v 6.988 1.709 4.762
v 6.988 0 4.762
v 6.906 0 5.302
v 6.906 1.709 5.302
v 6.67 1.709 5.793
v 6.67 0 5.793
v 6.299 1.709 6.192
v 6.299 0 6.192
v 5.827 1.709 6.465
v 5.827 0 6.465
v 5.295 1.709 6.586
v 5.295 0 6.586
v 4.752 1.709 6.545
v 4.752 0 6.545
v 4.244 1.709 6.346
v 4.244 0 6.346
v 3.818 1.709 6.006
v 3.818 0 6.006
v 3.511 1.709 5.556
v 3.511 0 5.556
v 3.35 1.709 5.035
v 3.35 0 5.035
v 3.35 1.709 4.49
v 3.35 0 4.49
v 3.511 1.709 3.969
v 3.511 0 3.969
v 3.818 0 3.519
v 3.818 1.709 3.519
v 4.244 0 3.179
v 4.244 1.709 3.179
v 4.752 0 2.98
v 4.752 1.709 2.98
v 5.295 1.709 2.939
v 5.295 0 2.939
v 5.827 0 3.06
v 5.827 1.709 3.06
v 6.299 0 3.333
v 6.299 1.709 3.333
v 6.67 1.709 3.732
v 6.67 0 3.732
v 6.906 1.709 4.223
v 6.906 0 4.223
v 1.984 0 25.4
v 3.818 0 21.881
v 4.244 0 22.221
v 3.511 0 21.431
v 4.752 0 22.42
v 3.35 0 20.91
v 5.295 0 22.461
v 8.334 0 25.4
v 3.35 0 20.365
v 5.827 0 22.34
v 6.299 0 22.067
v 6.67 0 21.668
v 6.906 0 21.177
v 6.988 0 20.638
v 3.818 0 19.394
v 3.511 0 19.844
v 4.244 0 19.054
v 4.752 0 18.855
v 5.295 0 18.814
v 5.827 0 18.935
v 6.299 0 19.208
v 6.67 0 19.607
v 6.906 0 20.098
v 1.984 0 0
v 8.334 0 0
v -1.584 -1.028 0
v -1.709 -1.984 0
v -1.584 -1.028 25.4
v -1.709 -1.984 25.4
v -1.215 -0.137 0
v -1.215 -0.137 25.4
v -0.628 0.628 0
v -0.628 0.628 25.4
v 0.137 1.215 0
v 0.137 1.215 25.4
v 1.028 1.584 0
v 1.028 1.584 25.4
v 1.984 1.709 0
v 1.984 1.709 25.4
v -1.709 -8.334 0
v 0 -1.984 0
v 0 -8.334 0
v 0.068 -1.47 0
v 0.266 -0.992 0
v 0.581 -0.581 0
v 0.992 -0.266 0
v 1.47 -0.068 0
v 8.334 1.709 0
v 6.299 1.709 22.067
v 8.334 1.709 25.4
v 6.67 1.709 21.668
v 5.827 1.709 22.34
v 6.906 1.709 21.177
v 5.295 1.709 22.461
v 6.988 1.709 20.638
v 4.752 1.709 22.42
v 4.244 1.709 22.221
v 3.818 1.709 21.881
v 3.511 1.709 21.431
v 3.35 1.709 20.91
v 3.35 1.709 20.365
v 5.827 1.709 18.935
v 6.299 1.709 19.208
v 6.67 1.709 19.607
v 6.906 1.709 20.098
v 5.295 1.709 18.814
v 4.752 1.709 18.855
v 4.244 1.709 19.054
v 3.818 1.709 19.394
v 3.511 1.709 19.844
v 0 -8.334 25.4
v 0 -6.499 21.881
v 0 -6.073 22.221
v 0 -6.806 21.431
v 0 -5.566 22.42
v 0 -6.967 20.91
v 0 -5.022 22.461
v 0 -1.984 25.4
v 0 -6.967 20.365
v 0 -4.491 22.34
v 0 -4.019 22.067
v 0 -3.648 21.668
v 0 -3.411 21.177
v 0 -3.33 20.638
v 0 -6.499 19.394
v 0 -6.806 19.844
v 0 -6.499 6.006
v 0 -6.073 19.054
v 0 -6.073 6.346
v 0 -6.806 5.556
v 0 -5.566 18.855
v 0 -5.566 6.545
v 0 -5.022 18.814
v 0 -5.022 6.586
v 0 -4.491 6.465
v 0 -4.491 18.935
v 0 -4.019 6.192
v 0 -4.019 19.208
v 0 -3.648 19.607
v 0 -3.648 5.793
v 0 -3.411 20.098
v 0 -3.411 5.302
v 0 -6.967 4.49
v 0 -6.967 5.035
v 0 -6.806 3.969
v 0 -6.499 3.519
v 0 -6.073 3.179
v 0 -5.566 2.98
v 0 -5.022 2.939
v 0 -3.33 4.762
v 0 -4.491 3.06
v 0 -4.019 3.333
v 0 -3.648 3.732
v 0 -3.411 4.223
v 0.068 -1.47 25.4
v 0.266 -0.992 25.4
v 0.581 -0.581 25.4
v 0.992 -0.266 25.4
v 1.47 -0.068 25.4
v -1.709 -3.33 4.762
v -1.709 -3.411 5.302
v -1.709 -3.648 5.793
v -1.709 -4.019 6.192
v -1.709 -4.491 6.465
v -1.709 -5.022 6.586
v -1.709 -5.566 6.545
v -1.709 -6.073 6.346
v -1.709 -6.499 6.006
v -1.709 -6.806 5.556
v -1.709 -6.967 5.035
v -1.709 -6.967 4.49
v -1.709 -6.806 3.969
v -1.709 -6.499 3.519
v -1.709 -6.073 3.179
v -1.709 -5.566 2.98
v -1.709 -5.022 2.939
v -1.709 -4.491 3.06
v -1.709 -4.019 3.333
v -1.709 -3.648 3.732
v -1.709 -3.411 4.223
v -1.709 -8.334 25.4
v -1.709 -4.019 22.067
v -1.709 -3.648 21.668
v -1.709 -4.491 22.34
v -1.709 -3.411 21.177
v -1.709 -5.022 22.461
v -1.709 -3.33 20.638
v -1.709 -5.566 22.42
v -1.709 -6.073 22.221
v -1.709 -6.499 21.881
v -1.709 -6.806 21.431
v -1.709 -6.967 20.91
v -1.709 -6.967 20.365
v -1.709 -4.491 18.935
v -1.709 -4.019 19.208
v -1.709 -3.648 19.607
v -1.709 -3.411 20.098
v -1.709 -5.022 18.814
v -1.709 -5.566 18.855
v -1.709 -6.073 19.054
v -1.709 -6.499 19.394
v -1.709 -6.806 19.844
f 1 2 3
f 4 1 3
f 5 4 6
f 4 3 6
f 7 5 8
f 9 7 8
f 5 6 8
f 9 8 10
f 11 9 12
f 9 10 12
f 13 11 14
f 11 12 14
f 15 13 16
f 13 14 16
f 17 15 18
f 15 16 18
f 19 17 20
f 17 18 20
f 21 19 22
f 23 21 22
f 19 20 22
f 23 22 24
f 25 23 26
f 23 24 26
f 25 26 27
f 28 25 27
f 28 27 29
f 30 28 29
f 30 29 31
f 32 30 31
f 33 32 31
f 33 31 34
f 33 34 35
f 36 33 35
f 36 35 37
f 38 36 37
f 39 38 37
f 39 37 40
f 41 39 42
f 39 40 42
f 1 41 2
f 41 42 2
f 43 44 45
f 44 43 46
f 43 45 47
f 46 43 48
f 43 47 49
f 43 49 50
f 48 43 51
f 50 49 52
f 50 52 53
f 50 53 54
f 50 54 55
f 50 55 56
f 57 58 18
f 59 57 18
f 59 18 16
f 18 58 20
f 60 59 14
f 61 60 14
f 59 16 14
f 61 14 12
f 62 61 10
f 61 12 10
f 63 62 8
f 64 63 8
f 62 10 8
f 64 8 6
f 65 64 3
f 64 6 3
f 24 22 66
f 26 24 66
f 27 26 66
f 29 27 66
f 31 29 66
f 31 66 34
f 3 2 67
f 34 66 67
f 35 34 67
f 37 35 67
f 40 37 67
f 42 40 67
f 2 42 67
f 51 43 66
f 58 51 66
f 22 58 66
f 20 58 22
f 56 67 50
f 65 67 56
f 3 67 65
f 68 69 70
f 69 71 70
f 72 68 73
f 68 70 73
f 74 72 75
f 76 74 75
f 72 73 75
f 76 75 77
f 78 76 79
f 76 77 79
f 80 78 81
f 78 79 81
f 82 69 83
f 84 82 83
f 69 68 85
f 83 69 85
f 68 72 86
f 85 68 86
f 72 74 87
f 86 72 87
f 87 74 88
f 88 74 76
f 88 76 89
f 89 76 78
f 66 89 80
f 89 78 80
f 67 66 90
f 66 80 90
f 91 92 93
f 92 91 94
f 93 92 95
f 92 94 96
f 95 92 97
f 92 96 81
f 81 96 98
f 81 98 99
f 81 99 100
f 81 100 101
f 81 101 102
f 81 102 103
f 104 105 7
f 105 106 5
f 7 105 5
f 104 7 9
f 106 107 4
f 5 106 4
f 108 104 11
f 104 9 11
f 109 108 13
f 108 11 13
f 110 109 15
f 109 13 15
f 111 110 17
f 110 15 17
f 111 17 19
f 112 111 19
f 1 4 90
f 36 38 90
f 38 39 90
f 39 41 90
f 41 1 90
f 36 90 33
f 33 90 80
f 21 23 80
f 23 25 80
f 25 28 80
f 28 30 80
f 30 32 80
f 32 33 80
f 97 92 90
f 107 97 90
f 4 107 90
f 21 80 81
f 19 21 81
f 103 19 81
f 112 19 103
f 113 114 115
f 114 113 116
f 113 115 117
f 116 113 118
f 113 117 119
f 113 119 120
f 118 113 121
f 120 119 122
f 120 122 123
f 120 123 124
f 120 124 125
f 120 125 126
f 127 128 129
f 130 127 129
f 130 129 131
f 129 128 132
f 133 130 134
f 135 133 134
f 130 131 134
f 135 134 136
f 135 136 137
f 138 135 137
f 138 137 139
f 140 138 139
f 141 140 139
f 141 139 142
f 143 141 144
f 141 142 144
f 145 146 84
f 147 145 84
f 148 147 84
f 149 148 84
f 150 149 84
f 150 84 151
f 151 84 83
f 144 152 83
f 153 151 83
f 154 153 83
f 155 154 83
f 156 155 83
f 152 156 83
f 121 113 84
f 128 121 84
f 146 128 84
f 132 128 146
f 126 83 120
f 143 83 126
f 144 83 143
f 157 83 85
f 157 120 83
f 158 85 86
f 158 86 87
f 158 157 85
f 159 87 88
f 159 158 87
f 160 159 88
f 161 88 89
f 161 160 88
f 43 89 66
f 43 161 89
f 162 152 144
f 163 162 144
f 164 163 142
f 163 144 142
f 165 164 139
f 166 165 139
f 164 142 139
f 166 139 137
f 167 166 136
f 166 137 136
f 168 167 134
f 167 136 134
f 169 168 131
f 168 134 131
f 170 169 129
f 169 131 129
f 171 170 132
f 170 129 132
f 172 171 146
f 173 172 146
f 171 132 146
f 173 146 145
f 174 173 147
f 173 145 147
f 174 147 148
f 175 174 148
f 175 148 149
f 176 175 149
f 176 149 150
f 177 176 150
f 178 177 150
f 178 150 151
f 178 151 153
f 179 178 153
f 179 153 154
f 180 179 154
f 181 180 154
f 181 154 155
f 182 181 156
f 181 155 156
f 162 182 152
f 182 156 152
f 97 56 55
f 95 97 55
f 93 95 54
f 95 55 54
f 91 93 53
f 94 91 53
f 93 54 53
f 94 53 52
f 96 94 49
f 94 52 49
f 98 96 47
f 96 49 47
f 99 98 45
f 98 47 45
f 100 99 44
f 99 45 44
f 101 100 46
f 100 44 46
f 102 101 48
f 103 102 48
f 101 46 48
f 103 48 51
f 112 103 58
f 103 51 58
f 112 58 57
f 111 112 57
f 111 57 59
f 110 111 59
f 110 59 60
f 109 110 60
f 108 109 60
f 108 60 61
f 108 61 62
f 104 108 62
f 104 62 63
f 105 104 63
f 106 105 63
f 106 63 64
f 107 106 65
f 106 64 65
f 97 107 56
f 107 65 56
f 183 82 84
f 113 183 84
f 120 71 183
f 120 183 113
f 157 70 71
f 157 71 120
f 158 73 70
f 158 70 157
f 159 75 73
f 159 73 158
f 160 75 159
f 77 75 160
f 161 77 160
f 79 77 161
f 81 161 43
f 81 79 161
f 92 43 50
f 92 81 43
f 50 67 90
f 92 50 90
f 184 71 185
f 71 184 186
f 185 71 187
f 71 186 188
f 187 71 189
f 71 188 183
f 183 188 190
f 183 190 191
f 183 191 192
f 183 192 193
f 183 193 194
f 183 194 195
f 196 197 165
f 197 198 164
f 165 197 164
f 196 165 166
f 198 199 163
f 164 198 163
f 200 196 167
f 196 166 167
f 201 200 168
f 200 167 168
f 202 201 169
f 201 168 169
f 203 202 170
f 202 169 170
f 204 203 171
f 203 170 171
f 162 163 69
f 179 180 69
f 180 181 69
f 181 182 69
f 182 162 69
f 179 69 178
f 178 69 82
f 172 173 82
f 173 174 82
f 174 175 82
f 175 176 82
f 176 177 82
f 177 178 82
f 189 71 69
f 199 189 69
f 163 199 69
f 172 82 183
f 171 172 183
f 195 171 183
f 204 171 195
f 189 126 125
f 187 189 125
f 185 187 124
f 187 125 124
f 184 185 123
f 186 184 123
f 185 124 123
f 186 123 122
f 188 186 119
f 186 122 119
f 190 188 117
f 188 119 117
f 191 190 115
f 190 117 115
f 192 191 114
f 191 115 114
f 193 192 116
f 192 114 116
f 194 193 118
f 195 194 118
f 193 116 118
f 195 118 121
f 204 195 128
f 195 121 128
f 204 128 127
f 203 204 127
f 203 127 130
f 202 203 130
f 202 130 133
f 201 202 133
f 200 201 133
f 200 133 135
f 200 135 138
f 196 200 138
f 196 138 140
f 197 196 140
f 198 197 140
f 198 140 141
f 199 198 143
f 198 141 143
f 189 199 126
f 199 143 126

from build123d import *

# Parameters (mm, degrees)
F1_DEPTH = 25.4
F2_R     = 1.8288
F3_DEPTH = 1.70942
F4_R     = 1.8288
F5_DEPTH = 1.70942
F6_R     = 1.98374
F7_R     = 3.69316


with BuildPart() as f1:
    # F0 (on Top) → F1 (new body)
    with BuildSketch(Plane.XY):
        Polygon((-1.70942, -8.33374), (0, -8.33374), (0, 0), (8.33374, 0), (8.33374, 1.70942), (-1.70942, 1.70942), align=None)
    extrude(amount=F1_DEPTH)

    # F2 (on face) → F3 (cut, through all)
    with BuildSketch(Plane.XZ):
        with Locations((5.15874, 20.6375)):
            Circle(F2_R)
        with Locations((5.15874, 4.7625)):
            Circle(F2_R)
    extrude(amount=-F3_DEPTH, mode=Mode.SUBTRACT)

    # F4 (on face) → F5 (cut, through all)
    with BuildSketch(Plane.YZ):
        with Locations((-5.15874, 20.6375)):
            Circle(F4_R)
        with Locations((-5.15874, 4.7625)):
            Circle(F4_R)
    extrude(amount=-F5_DEPTH, mode=Mode.SUBTRACT)

    # F6
    f6_edges = [f1.edges().sort_by_distance(p)[0] for p in [
        (0, 0, 12.7),
    ]]
    fillet(f6_edges, radius=F6_R)

    # F7
    f7_edges = [f1.edges().sort_by_distance(p)[0] for p in [
        (-1.70942, 1.70942, 12.7),
    ]]
    fillet(f7_edges, radius=F7_R)


solid = f1.part
